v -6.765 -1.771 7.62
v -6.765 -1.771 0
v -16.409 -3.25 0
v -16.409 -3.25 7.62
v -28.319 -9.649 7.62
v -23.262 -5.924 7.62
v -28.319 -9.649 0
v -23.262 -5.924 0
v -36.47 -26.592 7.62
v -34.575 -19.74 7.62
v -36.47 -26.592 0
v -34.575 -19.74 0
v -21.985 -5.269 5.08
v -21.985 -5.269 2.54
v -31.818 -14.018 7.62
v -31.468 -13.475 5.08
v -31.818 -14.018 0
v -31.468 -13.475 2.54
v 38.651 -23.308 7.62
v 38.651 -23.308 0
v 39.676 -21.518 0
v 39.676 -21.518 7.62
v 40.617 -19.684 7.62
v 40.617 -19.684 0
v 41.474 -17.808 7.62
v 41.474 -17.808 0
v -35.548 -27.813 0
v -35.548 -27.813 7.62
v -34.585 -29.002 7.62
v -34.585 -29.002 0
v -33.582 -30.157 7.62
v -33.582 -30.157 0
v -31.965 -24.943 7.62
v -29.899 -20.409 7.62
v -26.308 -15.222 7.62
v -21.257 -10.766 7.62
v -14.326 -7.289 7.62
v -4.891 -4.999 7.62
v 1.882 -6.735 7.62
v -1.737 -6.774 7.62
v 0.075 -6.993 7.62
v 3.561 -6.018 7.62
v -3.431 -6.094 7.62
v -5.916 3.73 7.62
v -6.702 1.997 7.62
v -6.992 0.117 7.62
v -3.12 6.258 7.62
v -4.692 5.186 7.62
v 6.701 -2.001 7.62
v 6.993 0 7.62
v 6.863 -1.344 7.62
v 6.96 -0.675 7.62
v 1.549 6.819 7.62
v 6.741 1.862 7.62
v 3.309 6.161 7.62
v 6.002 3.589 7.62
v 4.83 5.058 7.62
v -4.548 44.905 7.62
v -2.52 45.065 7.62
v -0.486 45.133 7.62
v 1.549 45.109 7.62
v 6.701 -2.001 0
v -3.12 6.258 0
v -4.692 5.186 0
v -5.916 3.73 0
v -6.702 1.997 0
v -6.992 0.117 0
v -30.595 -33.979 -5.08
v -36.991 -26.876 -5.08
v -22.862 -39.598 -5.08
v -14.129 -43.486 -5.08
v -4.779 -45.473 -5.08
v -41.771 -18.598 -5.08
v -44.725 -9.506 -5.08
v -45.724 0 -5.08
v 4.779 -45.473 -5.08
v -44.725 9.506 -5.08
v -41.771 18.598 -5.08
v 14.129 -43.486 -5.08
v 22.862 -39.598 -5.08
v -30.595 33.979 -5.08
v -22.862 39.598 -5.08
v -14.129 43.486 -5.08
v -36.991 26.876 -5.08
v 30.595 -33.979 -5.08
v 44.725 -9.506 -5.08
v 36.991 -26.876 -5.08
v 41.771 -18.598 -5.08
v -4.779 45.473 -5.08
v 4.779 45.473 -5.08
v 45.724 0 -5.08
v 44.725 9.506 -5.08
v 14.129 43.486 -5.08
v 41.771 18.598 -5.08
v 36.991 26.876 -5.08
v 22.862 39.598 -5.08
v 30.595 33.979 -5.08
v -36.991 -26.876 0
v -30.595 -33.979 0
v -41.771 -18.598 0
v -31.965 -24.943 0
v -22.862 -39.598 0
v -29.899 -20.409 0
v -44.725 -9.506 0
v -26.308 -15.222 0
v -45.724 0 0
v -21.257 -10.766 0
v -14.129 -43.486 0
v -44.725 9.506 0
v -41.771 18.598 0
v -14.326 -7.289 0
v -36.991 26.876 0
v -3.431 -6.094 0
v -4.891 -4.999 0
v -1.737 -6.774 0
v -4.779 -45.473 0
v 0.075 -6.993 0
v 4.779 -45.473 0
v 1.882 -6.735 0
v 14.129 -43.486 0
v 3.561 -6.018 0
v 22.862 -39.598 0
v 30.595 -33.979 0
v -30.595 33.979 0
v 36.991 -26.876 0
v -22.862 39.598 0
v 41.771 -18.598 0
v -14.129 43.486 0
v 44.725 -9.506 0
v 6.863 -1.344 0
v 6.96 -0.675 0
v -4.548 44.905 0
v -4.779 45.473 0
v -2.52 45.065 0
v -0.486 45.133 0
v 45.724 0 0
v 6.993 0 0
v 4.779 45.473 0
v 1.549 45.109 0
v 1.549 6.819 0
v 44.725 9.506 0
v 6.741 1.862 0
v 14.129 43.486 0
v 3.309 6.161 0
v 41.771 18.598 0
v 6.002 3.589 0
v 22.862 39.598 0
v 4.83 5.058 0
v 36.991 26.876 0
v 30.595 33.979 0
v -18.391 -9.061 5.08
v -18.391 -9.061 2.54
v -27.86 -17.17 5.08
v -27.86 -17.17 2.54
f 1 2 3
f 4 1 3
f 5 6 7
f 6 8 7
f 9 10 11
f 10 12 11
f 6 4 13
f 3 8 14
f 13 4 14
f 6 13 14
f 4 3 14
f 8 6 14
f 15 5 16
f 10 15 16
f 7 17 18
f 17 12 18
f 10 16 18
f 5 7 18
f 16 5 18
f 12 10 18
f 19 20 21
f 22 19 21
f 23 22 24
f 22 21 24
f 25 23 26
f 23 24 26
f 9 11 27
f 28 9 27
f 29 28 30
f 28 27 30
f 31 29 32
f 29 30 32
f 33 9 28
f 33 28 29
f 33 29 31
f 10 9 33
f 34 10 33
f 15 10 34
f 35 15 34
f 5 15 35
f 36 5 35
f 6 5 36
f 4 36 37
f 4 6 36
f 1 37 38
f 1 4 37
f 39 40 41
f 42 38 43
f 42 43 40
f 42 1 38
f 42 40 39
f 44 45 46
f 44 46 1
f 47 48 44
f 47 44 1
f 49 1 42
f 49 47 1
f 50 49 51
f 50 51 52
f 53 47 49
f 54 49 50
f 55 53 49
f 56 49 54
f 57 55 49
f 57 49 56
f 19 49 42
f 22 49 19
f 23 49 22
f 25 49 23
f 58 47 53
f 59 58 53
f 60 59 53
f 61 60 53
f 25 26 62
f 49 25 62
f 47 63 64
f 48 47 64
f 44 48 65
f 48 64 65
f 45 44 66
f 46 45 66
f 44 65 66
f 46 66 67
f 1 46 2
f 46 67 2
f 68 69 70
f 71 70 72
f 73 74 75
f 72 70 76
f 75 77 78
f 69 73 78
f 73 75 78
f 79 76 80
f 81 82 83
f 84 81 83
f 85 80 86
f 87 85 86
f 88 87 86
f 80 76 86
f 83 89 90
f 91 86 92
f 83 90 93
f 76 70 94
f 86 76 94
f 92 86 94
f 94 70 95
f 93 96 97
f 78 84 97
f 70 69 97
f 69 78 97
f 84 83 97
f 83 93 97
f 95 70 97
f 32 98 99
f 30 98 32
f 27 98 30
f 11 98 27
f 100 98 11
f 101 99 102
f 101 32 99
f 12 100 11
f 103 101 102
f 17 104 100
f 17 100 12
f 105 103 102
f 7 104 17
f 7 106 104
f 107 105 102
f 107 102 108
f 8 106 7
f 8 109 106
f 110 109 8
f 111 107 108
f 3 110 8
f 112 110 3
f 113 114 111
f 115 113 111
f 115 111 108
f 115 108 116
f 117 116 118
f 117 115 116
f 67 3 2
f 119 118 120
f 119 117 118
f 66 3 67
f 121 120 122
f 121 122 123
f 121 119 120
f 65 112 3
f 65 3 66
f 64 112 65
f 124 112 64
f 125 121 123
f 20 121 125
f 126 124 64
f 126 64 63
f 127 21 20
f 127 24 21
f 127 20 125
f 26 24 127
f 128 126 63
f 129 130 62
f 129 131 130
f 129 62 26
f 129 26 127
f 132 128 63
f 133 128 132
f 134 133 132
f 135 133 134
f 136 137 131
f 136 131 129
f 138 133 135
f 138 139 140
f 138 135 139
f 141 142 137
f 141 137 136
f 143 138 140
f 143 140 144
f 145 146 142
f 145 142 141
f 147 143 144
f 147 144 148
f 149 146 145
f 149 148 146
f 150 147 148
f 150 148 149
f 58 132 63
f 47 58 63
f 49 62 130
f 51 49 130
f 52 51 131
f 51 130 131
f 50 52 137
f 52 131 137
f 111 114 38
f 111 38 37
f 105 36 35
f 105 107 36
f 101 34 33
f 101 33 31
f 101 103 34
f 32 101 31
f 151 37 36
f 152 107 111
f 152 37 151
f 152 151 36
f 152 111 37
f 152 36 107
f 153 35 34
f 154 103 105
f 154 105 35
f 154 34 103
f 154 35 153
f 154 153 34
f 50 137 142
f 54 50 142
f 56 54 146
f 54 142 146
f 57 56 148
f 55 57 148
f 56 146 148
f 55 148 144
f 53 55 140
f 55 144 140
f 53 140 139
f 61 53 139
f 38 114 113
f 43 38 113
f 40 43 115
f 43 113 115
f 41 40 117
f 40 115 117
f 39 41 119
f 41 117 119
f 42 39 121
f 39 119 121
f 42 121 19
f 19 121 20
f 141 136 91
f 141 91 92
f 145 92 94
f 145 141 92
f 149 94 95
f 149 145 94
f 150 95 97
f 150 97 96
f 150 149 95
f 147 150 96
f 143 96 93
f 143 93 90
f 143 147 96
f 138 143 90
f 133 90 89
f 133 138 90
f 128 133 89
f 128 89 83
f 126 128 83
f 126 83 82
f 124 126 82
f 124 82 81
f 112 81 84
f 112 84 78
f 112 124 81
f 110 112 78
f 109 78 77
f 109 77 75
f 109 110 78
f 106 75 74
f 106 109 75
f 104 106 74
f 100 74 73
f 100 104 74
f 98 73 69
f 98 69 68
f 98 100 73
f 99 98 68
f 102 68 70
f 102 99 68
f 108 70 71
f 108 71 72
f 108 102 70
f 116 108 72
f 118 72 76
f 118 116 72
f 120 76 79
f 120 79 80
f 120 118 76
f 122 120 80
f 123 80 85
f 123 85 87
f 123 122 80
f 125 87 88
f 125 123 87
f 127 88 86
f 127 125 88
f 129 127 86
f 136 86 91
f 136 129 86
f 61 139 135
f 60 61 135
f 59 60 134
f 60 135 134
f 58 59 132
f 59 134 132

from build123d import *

# Parameters (mm, degrees)
F1_DEPTH = 7.62
F2_R     = 45.72373
F3_DEPTH = 5.08


with BuildPart() as f1:
    # F0 (on Top) → F1 (new body)
    with BuildSketch(Plane.XY):
        with BuildLine():
            ThreePointArc((-3.120344, 6.258425), (-0.834145, 6.943244), (1.549203, 6.819414))
            Line((1.549203, 6.819414), (1.549203, 45.108627))
            ThreePointArc((1.549203, 45.108627), (-1.503064, 45.110188), (-4.548458, 44.905454))
            Line((-4.548458, 44.905454), (-3.120344, 6.258425))
        make_face()
        with BuildLine():
            ThreePointArc((-4.890711, -4.998538), (-6.047151, -3.512321), (-6.765095, -1.771418))
            add(Edge.make_bspline(
                [(-6.765095, -1.771418), (-25.271352, -2.981601), (-33.291422, -10.951445), (-36.469723, -26.592246)],
                knots=[0, 0, 0, 0, 38.709668, 38.709668, 38.709668, 38.709668], degree=3))
            ThreePointArc((-36.469723, -26.592246), (-35.071161, -28.411299), (-33.58196, -30.156927))
            add(Edge.make_bspline(
                [(-4.890711, -4.998538), (-20.500017, -7.315121), (-29.63965, -14.453498), (-33.58196, -30.156927)],
                knots=[0, 0, 0, 0, 38.159301, 38.159301, 38.159301, 38.159301], degree=3))
        make_face()
        with BuildLine():
            Line((41.473617, -17.80807), (6.700846, -2.000774))
            ThreePointArc((6.700846, -2.000774), (5.510265, -4.305974), (3.561225, -6.018481))
            Line((3.561225, -6.018481), (38.651442, -23.307816))
            ThreePointArc((38.651442, -23.307816), (40.156793, -20.606314), (41.473617, -17.80807))
        make_face()
        with BuildLine():
            ThreePointArc((6.700846, -2.000774), (6.919704, -1.011008), (6.993171, 0))
            ThreePointArc((6.993171, 0), (5.465267, 4.362946), (1.549203, 6.819414))
            ThreePointArc((1.549203, 6.819414), (-0.834145, 6.943244), (-3.120344, 6.258425))
            ThreePointArc((-3.120344, 6.258425), (-6.367894, 2.890391), (-6.765095, -1.771418))
            ThreePointArc((-6.765095, -1.771418), (-6.047151, -3.512321), (-4.890711, -4.998538))
            ThreePointArc((-4.890711, -4.998538), (-0.837827, -6.942801), (3.561225, -6.018481))
            ThreePointArc((3.561225, -6.018481), (5.510265, -4.305974), (6.700846, -2.000774))
        make_face()
    extrude(amount=F1_DEPTH)

    # F2 (on Top) → F3 (join)
    with BuildSketch(Plane.XY):
        Circle(F2_R)
    extrude(amount=-F3_DEPTH)


solid = f1.part
